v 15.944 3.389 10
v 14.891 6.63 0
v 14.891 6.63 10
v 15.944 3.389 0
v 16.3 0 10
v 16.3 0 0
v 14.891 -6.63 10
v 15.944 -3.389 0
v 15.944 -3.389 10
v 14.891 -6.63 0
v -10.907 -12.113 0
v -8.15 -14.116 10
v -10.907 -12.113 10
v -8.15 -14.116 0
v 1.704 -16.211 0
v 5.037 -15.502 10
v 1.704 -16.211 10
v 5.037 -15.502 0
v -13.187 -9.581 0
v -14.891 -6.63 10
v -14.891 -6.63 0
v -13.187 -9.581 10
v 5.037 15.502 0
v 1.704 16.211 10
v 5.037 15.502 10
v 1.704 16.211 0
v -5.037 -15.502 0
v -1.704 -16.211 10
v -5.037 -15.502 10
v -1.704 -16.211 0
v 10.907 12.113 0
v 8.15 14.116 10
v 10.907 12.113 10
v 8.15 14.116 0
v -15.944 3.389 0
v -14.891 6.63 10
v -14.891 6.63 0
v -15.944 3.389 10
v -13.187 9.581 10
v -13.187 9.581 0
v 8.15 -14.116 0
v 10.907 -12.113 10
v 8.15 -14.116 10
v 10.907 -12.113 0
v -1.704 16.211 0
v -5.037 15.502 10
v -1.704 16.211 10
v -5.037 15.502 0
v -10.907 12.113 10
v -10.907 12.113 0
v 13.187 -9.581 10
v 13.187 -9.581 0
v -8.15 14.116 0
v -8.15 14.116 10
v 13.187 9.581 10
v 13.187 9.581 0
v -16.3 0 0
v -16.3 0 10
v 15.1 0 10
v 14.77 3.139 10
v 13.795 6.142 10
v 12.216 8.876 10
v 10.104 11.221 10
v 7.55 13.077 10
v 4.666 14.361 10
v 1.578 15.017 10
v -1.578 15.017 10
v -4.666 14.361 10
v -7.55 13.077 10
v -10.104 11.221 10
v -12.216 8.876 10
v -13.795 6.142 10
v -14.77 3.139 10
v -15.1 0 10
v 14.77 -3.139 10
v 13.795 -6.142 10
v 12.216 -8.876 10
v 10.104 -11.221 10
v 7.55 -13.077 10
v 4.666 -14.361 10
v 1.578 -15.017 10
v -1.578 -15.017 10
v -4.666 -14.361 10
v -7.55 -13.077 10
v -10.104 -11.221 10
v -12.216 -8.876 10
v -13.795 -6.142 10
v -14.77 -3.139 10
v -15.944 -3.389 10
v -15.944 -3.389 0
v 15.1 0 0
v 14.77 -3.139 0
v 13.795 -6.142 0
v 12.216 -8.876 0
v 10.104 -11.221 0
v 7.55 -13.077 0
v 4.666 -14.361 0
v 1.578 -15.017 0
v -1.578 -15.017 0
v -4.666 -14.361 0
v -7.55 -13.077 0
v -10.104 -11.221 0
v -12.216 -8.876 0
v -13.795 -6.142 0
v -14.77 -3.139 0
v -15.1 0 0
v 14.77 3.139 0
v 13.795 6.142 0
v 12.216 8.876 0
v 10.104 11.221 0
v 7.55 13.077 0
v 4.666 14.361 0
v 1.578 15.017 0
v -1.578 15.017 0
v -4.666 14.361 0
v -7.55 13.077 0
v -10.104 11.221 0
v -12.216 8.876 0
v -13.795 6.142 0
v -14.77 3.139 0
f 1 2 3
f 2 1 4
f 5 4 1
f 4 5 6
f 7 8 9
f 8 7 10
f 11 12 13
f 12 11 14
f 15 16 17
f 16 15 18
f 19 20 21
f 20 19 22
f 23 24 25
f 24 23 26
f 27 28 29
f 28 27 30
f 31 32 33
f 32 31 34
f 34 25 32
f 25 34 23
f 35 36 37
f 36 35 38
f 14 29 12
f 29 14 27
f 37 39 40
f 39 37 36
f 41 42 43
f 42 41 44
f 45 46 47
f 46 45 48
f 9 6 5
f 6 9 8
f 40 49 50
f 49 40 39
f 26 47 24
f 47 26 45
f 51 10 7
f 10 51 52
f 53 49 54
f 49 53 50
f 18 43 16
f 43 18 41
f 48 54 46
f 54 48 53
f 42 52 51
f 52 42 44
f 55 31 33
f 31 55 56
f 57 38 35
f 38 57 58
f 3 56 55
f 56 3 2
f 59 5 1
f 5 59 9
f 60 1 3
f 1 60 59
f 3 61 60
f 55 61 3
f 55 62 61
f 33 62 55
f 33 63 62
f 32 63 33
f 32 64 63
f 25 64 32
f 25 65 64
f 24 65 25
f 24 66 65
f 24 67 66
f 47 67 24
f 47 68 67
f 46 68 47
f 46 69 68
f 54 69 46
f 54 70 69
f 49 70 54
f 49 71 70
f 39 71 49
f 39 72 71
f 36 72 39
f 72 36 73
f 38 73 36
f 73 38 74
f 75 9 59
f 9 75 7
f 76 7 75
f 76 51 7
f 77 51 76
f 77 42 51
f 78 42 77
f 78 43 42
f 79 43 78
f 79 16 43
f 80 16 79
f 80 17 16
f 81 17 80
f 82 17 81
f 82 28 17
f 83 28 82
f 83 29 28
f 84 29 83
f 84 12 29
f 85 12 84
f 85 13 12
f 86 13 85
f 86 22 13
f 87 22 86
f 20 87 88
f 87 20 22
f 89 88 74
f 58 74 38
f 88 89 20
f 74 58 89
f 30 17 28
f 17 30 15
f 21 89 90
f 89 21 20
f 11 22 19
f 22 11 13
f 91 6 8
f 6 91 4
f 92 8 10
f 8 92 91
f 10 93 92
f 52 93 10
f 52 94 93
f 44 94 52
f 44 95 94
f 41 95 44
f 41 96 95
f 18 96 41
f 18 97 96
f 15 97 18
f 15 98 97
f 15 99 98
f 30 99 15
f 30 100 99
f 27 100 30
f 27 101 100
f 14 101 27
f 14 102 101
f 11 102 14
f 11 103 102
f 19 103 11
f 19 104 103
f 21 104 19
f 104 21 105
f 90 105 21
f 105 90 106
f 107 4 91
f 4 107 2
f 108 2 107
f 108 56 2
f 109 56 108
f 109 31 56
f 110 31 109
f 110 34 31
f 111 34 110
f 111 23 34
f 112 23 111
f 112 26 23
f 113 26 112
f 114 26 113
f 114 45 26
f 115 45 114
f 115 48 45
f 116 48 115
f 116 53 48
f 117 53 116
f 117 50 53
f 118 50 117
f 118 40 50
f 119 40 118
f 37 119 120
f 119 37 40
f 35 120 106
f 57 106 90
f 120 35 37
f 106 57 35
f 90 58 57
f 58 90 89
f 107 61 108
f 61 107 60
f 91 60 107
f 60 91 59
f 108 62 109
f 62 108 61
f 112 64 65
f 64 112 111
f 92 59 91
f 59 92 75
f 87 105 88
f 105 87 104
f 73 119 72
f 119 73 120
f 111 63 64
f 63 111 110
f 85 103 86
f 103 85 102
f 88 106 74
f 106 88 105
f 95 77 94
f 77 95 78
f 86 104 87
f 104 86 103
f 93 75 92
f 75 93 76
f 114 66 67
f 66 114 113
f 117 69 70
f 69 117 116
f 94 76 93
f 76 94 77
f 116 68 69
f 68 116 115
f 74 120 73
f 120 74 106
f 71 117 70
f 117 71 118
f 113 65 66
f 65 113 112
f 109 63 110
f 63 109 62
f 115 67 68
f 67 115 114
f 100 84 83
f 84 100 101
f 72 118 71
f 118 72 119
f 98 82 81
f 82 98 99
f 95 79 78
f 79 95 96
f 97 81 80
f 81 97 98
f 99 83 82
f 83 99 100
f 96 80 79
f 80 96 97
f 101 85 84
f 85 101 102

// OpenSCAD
data = [[30.2, 10]];  // heights and diameters of tubes

for (i = [0 : len(data) - 1])
difference(){
    cylinder(data[i][1], data[i][0]/2 + 1.2, data[i][0]/2 + 1.2);
    translate([0, 0, -1]) cylinder(data[i][1]+2, data[i][0]/2, data[i][0]/2);
}
